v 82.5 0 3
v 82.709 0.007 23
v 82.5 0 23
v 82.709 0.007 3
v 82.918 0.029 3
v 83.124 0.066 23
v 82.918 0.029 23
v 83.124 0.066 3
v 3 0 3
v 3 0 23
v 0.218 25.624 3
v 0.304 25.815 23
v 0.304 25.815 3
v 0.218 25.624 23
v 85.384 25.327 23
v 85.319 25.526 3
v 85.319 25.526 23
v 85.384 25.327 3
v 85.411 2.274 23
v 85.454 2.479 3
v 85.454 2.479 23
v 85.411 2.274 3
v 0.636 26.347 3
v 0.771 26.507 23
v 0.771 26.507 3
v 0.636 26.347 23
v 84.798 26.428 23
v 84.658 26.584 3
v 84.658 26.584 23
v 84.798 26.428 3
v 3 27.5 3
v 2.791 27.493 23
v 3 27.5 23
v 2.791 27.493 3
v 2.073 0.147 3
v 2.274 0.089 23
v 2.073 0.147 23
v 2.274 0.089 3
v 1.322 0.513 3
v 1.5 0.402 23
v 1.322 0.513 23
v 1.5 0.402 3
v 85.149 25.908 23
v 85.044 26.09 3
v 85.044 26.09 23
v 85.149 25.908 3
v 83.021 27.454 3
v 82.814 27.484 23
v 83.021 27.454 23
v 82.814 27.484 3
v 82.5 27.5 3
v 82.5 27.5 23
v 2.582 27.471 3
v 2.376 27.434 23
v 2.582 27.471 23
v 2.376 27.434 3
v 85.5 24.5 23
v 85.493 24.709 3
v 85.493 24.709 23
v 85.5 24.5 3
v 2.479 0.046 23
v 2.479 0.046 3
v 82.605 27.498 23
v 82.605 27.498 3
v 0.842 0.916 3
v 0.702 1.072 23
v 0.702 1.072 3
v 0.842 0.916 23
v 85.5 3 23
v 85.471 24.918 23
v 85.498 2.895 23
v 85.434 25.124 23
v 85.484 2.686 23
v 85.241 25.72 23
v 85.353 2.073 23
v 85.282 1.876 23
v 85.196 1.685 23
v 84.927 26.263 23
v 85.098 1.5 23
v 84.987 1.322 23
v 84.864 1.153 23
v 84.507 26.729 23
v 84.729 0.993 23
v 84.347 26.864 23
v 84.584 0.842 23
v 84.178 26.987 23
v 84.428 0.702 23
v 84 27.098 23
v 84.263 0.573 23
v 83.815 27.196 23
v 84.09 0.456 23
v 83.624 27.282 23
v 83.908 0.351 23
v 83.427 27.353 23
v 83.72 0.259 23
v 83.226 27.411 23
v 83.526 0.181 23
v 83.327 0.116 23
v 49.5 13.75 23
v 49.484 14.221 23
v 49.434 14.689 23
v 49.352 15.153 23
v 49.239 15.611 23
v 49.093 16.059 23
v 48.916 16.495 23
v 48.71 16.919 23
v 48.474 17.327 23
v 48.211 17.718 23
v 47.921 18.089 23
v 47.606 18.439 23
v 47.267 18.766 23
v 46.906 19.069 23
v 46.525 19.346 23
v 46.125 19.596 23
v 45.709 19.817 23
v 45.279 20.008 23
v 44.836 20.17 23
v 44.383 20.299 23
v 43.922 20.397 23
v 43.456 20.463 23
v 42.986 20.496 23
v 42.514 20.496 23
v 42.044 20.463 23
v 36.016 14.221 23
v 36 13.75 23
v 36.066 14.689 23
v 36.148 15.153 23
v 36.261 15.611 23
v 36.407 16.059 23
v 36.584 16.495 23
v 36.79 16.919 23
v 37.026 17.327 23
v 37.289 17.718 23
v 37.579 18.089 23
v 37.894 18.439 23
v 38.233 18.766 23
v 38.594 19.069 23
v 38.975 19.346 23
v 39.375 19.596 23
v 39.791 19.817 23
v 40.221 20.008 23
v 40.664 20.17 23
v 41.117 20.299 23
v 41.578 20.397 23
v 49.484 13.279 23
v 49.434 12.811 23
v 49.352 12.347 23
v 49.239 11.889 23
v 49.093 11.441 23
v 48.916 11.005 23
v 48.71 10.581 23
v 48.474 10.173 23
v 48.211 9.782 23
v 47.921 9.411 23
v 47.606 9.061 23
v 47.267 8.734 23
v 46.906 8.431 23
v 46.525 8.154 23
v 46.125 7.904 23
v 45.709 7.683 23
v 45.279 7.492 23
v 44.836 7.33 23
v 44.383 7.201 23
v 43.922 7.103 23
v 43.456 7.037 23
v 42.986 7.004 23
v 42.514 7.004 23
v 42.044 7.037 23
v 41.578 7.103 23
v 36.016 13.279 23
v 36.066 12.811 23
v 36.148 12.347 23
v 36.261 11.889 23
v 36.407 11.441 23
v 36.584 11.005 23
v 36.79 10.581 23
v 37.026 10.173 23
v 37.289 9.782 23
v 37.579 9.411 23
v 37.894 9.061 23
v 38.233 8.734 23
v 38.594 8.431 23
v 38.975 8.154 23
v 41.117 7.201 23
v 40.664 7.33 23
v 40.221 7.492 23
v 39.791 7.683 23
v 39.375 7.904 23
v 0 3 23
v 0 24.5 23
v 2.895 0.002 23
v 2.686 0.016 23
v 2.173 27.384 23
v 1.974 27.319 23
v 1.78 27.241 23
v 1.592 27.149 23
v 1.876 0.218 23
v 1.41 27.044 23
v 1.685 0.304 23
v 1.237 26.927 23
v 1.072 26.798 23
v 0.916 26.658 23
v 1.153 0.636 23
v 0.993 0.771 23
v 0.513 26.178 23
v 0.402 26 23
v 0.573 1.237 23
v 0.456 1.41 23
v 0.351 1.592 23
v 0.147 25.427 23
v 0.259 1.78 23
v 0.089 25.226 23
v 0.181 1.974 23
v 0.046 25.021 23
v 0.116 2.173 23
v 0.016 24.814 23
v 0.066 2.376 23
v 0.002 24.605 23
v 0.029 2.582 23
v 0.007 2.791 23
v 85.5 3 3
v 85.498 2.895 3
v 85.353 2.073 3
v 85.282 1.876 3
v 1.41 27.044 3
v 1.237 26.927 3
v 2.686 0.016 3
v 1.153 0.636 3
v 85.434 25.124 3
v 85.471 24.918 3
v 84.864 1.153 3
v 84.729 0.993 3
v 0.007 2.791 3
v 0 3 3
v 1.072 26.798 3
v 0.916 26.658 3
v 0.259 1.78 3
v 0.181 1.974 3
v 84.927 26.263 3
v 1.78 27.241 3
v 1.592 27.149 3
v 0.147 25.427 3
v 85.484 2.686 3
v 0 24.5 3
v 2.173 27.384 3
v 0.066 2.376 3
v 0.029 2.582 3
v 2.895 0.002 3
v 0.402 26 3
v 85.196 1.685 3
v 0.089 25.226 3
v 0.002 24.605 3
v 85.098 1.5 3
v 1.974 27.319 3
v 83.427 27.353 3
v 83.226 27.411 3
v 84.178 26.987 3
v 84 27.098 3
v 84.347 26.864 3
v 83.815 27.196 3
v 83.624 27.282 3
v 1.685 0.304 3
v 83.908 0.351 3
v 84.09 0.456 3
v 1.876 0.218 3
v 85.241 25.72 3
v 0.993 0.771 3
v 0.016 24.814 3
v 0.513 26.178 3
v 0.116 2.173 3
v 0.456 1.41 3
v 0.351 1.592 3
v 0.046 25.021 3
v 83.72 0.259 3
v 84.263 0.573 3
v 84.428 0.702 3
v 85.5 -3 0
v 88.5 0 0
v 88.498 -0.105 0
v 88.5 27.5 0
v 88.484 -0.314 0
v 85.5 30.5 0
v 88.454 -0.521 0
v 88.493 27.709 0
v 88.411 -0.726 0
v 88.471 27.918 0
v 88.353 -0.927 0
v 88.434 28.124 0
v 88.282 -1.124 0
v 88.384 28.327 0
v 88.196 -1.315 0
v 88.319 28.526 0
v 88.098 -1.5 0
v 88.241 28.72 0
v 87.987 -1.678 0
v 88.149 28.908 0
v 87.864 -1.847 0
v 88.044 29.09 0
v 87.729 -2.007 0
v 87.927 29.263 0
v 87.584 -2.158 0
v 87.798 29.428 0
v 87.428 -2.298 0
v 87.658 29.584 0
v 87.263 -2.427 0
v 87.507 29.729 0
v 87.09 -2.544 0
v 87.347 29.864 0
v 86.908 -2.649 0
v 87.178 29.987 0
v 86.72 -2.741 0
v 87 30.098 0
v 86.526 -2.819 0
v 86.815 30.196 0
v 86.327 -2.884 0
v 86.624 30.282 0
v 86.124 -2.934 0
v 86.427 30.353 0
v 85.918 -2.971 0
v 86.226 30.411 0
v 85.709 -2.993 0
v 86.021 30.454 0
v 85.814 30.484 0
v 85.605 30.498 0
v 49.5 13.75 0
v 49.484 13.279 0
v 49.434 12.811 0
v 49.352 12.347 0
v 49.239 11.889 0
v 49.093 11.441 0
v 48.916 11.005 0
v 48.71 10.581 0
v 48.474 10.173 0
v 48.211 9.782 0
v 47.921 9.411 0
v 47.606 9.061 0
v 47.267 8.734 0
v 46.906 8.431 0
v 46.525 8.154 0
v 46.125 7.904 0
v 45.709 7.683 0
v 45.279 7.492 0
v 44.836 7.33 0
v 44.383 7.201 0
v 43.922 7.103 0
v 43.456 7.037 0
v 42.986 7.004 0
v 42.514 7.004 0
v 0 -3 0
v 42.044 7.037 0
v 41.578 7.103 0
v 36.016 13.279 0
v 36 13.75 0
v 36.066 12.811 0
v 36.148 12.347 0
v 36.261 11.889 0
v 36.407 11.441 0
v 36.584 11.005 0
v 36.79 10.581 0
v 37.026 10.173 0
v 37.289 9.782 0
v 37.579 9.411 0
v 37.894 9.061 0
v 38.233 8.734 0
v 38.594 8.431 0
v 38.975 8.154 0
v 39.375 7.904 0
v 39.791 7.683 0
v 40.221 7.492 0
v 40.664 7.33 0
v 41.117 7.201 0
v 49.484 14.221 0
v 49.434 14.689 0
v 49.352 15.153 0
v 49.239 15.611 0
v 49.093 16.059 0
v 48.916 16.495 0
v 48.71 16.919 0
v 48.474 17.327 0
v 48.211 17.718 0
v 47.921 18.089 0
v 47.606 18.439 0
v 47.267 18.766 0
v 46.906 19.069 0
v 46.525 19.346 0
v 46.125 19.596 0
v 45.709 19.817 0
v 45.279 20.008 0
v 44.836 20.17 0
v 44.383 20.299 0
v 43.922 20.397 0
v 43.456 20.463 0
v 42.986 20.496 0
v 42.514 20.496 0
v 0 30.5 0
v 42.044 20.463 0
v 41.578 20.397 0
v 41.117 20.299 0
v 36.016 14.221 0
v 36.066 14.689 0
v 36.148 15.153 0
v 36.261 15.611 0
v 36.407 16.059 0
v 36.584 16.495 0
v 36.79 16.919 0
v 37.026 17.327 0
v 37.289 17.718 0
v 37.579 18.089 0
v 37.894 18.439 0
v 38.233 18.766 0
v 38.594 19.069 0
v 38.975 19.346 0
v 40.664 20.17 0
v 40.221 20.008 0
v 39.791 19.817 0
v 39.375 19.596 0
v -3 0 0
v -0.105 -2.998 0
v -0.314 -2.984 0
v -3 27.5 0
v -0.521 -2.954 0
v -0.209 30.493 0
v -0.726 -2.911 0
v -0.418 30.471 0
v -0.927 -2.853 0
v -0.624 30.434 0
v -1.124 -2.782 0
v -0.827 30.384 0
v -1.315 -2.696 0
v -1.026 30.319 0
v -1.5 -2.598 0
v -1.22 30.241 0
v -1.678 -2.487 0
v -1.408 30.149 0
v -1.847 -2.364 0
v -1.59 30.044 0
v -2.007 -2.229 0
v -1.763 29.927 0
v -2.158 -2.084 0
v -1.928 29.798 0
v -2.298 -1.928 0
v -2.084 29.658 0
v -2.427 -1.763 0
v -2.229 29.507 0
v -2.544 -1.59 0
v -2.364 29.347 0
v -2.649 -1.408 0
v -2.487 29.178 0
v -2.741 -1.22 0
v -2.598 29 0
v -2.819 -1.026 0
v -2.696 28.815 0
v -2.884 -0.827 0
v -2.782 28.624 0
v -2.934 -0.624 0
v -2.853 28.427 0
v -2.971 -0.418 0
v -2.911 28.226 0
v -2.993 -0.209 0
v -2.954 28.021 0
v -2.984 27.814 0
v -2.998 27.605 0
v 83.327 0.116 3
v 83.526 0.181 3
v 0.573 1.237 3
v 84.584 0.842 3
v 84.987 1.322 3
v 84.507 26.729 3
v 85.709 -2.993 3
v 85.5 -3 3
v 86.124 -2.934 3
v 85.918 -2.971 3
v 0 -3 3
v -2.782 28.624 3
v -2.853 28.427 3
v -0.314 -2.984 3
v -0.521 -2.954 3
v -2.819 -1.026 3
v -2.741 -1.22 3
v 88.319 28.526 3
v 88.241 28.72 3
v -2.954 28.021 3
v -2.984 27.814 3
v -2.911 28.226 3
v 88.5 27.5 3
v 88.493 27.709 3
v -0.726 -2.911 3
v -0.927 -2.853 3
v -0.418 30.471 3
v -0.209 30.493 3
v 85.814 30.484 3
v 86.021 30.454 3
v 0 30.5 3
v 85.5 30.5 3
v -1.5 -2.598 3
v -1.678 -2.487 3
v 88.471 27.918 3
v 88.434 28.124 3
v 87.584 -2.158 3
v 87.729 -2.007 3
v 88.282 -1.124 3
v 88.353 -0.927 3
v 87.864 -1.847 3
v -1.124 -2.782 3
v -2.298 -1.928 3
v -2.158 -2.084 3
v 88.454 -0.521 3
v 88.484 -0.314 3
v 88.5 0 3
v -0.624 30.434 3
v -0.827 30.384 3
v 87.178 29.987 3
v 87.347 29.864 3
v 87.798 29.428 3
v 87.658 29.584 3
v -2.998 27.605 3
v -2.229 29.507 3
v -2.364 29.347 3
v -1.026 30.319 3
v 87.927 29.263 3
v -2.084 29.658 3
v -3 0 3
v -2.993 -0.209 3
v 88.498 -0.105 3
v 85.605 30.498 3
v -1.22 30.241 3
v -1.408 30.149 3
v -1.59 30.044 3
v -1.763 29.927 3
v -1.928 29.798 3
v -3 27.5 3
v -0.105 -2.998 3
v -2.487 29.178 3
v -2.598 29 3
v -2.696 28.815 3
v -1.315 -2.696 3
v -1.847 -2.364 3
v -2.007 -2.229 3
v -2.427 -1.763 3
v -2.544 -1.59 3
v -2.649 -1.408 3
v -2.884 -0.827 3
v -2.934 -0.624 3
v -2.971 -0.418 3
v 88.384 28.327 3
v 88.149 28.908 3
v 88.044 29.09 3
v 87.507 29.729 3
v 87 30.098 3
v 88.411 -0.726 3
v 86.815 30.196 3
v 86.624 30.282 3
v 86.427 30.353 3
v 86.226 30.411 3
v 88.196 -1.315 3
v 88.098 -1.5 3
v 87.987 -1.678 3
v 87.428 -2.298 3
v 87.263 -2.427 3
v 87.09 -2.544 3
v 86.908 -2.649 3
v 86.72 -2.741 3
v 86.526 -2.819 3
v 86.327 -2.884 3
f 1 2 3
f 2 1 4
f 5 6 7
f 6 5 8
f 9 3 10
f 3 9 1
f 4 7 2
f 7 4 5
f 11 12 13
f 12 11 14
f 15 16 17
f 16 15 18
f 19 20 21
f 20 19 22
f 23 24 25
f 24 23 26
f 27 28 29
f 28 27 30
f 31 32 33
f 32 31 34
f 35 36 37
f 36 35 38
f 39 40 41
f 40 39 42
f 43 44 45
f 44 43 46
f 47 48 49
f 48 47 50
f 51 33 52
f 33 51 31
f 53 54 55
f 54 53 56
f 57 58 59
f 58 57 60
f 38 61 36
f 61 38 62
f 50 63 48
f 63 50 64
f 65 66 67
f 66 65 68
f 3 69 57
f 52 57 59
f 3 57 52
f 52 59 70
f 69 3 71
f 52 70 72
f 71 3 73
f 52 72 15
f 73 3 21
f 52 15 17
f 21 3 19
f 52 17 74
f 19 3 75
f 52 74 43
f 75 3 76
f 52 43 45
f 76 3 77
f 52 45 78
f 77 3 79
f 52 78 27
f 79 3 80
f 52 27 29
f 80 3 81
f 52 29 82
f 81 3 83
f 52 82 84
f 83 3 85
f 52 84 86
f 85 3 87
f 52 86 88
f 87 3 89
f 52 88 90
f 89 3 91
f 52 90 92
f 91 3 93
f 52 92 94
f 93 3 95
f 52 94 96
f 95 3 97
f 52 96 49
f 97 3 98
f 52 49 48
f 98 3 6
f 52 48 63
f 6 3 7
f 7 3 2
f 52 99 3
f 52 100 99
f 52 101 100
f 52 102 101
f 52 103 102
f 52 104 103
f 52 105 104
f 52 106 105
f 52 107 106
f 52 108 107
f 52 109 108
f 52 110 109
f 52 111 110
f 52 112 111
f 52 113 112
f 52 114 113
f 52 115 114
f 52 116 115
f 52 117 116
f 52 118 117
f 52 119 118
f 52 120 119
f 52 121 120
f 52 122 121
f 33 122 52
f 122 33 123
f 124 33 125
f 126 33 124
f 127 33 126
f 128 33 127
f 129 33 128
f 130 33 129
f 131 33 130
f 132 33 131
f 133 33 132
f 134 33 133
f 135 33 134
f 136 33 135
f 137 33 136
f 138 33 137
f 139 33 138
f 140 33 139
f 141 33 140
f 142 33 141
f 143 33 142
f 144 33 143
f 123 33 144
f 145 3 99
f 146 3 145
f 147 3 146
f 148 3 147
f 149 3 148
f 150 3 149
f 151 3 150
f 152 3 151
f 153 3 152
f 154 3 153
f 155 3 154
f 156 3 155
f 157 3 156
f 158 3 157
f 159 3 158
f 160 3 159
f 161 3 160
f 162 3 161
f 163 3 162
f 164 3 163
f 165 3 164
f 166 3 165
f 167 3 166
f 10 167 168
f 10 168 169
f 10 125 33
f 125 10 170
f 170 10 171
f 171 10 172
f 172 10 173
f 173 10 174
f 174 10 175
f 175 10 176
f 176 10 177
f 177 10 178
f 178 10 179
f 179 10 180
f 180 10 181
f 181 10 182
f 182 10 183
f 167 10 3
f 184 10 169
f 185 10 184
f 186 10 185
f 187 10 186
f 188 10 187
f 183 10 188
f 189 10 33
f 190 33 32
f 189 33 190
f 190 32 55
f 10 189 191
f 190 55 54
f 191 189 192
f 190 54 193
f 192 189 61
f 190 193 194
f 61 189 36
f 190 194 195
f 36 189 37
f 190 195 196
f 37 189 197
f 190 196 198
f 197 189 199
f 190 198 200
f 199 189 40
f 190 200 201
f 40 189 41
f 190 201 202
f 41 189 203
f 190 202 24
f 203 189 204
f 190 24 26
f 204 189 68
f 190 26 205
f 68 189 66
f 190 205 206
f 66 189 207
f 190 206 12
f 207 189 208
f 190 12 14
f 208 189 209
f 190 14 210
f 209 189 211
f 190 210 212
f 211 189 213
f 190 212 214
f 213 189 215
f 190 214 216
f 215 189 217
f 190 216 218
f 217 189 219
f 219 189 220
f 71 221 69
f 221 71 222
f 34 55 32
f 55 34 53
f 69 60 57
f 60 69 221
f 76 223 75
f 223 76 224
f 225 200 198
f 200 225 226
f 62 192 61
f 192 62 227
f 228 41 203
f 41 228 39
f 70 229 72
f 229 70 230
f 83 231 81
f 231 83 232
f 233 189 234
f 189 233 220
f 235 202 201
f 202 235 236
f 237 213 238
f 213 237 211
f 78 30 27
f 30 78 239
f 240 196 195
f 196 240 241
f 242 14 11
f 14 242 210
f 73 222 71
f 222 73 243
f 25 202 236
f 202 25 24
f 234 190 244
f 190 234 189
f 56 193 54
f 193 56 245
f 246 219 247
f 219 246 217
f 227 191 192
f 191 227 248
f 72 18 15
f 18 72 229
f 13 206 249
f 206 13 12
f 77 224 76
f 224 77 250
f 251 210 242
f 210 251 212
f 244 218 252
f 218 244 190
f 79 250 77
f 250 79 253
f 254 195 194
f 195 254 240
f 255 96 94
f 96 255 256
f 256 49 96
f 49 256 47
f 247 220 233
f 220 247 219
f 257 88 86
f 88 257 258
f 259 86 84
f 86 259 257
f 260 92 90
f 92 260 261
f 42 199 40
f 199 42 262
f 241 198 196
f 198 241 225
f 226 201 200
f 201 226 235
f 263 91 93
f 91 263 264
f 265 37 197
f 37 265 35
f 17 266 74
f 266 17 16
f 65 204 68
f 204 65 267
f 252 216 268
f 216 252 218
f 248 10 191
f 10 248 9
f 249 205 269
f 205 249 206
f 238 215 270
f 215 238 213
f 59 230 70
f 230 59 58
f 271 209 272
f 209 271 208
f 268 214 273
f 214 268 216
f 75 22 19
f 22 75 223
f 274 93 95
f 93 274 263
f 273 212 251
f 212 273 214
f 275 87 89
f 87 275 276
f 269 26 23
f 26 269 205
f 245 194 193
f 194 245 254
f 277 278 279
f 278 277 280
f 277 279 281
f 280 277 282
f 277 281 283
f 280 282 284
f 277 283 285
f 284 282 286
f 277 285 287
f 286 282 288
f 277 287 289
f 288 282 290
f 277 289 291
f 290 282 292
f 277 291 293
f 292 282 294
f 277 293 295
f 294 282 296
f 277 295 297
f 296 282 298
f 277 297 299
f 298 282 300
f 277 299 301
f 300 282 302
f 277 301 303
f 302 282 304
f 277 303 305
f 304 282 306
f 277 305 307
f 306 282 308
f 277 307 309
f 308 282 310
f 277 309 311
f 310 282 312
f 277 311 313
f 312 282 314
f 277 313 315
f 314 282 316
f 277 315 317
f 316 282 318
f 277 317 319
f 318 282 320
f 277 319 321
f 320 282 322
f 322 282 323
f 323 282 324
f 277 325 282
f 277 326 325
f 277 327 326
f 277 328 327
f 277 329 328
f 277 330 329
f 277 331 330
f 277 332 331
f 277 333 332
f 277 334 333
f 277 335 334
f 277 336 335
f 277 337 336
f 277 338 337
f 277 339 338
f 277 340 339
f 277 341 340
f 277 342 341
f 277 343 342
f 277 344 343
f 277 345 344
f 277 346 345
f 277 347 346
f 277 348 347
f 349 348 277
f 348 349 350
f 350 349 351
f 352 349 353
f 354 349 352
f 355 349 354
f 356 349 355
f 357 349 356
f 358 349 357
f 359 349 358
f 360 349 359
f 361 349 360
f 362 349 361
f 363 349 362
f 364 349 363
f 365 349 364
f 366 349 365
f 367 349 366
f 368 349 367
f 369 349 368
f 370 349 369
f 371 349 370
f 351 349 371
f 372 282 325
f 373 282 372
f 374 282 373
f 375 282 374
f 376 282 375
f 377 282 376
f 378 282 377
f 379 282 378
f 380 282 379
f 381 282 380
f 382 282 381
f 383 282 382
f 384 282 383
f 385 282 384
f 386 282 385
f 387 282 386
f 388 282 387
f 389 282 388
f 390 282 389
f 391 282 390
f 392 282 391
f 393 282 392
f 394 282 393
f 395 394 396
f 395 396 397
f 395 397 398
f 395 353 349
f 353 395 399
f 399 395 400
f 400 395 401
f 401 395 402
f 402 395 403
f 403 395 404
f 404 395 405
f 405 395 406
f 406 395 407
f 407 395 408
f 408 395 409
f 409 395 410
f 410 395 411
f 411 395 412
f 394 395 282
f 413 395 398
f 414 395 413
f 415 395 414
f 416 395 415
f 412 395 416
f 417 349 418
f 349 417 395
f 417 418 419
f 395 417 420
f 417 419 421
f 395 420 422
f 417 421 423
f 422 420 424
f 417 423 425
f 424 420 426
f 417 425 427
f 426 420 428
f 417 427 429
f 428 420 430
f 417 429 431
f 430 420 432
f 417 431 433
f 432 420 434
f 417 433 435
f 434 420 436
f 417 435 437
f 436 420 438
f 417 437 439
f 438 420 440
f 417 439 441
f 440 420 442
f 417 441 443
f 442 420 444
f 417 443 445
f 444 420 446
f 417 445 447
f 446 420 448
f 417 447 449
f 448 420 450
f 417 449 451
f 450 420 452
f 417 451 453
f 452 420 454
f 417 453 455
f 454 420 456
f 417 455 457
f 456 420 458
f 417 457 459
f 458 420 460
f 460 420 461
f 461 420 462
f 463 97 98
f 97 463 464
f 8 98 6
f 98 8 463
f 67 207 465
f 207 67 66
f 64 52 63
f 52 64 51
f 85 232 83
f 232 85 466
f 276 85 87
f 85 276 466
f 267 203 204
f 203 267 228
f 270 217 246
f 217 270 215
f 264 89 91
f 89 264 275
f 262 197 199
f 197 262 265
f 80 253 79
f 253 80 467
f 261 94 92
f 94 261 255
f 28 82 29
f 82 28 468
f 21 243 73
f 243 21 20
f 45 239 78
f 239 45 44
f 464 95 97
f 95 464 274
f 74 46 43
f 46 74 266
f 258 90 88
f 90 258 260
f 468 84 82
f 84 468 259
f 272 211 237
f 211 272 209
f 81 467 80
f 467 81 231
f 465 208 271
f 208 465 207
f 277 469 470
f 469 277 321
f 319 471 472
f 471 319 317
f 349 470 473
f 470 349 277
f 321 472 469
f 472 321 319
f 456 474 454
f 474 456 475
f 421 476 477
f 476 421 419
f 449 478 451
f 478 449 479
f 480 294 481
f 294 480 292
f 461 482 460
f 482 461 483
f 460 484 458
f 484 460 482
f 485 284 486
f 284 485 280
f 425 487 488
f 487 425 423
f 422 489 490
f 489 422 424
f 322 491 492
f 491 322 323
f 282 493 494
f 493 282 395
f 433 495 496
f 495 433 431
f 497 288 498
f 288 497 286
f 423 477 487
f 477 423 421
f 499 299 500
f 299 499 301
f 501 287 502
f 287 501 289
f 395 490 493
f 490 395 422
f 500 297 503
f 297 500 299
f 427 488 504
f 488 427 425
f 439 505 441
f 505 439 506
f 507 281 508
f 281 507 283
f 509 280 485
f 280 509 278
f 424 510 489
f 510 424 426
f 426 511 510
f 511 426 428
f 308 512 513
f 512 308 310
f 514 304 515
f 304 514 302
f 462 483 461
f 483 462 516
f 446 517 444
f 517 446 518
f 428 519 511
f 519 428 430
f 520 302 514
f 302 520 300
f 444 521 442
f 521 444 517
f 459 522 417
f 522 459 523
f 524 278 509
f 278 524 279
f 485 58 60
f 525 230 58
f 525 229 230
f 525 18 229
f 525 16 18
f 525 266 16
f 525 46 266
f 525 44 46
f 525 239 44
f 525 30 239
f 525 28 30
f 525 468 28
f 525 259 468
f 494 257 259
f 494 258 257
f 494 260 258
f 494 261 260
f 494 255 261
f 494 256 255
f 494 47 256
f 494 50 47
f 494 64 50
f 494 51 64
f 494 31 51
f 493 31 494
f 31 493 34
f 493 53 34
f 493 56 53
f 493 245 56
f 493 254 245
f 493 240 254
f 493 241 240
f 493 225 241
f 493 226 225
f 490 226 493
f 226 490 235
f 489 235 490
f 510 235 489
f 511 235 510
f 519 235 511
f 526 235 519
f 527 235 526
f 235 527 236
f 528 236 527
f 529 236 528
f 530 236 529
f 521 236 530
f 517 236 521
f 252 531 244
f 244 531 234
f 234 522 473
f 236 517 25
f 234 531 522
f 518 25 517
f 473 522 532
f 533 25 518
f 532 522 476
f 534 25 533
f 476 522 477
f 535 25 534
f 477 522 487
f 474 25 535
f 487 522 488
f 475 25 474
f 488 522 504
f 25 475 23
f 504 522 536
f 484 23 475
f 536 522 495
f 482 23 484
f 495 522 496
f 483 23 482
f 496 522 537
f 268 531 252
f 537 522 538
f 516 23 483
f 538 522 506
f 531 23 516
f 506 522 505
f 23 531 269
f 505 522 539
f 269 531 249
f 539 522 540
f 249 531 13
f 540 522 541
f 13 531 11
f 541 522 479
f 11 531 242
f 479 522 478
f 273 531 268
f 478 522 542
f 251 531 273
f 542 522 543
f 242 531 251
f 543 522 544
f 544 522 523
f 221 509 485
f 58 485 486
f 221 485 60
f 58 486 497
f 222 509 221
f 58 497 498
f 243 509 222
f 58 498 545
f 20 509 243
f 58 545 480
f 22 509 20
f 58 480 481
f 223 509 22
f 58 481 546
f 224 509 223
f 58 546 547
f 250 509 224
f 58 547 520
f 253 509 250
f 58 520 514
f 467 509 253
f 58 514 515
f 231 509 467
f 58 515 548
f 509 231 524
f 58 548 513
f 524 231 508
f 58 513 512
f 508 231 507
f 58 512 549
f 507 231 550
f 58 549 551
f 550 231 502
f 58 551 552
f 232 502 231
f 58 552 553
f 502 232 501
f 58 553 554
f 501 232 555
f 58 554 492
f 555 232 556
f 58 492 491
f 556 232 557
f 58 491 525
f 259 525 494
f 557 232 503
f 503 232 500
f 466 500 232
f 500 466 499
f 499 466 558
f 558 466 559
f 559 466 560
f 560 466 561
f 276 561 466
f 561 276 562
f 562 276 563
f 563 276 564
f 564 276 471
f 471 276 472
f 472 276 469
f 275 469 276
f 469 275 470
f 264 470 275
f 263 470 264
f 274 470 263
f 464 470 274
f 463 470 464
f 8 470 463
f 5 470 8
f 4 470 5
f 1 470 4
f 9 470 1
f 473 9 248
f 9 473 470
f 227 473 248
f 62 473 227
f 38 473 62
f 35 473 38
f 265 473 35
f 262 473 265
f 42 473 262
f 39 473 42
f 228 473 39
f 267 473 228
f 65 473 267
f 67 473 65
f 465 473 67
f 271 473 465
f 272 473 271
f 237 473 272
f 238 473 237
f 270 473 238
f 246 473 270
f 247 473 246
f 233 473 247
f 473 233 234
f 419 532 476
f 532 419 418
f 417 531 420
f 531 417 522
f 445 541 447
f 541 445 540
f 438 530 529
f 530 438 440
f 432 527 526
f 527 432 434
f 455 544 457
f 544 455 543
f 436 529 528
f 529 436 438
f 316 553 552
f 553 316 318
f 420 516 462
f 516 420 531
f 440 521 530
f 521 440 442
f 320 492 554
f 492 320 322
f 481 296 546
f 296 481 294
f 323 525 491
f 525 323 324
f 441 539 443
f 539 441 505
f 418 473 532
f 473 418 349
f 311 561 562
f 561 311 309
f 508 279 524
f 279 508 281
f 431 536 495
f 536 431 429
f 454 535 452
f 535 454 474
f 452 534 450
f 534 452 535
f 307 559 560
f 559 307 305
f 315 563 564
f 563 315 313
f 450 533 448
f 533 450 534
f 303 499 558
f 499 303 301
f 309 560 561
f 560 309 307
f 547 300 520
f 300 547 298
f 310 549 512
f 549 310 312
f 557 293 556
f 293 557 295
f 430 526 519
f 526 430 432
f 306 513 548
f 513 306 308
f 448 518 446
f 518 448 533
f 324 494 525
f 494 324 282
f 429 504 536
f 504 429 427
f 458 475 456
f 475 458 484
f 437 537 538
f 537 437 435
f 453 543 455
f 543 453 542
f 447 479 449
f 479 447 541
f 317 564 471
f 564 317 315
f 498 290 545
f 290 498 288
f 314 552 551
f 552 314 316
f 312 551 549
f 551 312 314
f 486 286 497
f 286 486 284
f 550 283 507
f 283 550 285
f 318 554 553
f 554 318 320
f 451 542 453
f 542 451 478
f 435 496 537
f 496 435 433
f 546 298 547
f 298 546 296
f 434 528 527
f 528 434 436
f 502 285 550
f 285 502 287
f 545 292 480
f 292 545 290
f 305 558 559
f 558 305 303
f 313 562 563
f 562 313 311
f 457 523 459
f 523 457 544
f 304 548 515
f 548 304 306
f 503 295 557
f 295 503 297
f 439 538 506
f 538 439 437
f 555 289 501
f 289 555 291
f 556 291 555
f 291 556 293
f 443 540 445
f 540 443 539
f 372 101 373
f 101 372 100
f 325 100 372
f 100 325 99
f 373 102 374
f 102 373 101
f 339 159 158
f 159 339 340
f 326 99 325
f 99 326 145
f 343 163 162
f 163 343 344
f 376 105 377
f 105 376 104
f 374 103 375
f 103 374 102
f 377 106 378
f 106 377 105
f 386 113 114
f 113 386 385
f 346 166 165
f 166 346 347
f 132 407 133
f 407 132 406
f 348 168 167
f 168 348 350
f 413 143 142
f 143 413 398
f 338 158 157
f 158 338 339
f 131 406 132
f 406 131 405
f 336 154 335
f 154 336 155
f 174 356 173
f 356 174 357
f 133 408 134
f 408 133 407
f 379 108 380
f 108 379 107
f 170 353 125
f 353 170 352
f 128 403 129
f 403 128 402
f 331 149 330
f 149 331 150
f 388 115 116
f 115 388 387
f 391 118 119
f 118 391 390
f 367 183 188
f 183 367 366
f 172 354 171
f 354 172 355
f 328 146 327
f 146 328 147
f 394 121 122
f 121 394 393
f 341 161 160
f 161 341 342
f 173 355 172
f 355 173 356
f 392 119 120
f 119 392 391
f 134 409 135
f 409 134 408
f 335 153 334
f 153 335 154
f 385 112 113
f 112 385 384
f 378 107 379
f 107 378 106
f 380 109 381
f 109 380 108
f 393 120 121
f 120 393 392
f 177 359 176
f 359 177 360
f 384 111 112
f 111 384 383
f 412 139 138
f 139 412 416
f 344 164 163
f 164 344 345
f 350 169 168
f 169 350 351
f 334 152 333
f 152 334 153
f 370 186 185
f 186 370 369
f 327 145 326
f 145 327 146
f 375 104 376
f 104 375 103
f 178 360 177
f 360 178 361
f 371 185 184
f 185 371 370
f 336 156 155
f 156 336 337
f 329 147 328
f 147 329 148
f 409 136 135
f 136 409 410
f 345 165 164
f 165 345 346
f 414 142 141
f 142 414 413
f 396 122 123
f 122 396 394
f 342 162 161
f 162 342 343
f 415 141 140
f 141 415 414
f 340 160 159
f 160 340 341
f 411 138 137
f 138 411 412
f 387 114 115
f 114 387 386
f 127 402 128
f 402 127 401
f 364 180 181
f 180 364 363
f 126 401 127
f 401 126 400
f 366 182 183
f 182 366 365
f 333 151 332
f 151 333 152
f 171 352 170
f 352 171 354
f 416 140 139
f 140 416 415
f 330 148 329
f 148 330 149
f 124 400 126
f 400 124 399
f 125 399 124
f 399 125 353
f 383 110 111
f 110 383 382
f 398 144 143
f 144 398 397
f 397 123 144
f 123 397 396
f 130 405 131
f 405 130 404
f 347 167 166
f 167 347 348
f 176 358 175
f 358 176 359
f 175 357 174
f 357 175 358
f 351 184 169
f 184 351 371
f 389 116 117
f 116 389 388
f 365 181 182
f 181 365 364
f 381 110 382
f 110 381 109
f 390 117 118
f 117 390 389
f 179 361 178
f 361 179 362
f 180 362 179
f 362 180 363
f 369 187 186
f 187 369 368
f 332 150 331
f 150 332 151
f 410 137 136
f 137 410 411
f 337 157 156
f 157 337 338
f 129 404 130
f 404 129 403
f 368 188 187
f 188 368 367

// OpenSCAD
post=13.5;
post_h=40;

base=5;


slot_corner=3;

lip=3;
cap=lip;

slot_x=85.5;
slot_y=27.5;
slot_z=23;
$fn=90;
pad=0.1;


difference() {
    union() {
        linear_extrude(height=slot_z)
        offset(slot_corner)
        offset(-slot_corner)
        square([slot_x,slot_y]);

        linear_extrude(height=cap)
        offset(lip)
        square([slot_x,slot_y]);
    }

    translate([slot_x/2,slot_y/2,-pad])
    cylinder(d=post,h=post_h);
}
